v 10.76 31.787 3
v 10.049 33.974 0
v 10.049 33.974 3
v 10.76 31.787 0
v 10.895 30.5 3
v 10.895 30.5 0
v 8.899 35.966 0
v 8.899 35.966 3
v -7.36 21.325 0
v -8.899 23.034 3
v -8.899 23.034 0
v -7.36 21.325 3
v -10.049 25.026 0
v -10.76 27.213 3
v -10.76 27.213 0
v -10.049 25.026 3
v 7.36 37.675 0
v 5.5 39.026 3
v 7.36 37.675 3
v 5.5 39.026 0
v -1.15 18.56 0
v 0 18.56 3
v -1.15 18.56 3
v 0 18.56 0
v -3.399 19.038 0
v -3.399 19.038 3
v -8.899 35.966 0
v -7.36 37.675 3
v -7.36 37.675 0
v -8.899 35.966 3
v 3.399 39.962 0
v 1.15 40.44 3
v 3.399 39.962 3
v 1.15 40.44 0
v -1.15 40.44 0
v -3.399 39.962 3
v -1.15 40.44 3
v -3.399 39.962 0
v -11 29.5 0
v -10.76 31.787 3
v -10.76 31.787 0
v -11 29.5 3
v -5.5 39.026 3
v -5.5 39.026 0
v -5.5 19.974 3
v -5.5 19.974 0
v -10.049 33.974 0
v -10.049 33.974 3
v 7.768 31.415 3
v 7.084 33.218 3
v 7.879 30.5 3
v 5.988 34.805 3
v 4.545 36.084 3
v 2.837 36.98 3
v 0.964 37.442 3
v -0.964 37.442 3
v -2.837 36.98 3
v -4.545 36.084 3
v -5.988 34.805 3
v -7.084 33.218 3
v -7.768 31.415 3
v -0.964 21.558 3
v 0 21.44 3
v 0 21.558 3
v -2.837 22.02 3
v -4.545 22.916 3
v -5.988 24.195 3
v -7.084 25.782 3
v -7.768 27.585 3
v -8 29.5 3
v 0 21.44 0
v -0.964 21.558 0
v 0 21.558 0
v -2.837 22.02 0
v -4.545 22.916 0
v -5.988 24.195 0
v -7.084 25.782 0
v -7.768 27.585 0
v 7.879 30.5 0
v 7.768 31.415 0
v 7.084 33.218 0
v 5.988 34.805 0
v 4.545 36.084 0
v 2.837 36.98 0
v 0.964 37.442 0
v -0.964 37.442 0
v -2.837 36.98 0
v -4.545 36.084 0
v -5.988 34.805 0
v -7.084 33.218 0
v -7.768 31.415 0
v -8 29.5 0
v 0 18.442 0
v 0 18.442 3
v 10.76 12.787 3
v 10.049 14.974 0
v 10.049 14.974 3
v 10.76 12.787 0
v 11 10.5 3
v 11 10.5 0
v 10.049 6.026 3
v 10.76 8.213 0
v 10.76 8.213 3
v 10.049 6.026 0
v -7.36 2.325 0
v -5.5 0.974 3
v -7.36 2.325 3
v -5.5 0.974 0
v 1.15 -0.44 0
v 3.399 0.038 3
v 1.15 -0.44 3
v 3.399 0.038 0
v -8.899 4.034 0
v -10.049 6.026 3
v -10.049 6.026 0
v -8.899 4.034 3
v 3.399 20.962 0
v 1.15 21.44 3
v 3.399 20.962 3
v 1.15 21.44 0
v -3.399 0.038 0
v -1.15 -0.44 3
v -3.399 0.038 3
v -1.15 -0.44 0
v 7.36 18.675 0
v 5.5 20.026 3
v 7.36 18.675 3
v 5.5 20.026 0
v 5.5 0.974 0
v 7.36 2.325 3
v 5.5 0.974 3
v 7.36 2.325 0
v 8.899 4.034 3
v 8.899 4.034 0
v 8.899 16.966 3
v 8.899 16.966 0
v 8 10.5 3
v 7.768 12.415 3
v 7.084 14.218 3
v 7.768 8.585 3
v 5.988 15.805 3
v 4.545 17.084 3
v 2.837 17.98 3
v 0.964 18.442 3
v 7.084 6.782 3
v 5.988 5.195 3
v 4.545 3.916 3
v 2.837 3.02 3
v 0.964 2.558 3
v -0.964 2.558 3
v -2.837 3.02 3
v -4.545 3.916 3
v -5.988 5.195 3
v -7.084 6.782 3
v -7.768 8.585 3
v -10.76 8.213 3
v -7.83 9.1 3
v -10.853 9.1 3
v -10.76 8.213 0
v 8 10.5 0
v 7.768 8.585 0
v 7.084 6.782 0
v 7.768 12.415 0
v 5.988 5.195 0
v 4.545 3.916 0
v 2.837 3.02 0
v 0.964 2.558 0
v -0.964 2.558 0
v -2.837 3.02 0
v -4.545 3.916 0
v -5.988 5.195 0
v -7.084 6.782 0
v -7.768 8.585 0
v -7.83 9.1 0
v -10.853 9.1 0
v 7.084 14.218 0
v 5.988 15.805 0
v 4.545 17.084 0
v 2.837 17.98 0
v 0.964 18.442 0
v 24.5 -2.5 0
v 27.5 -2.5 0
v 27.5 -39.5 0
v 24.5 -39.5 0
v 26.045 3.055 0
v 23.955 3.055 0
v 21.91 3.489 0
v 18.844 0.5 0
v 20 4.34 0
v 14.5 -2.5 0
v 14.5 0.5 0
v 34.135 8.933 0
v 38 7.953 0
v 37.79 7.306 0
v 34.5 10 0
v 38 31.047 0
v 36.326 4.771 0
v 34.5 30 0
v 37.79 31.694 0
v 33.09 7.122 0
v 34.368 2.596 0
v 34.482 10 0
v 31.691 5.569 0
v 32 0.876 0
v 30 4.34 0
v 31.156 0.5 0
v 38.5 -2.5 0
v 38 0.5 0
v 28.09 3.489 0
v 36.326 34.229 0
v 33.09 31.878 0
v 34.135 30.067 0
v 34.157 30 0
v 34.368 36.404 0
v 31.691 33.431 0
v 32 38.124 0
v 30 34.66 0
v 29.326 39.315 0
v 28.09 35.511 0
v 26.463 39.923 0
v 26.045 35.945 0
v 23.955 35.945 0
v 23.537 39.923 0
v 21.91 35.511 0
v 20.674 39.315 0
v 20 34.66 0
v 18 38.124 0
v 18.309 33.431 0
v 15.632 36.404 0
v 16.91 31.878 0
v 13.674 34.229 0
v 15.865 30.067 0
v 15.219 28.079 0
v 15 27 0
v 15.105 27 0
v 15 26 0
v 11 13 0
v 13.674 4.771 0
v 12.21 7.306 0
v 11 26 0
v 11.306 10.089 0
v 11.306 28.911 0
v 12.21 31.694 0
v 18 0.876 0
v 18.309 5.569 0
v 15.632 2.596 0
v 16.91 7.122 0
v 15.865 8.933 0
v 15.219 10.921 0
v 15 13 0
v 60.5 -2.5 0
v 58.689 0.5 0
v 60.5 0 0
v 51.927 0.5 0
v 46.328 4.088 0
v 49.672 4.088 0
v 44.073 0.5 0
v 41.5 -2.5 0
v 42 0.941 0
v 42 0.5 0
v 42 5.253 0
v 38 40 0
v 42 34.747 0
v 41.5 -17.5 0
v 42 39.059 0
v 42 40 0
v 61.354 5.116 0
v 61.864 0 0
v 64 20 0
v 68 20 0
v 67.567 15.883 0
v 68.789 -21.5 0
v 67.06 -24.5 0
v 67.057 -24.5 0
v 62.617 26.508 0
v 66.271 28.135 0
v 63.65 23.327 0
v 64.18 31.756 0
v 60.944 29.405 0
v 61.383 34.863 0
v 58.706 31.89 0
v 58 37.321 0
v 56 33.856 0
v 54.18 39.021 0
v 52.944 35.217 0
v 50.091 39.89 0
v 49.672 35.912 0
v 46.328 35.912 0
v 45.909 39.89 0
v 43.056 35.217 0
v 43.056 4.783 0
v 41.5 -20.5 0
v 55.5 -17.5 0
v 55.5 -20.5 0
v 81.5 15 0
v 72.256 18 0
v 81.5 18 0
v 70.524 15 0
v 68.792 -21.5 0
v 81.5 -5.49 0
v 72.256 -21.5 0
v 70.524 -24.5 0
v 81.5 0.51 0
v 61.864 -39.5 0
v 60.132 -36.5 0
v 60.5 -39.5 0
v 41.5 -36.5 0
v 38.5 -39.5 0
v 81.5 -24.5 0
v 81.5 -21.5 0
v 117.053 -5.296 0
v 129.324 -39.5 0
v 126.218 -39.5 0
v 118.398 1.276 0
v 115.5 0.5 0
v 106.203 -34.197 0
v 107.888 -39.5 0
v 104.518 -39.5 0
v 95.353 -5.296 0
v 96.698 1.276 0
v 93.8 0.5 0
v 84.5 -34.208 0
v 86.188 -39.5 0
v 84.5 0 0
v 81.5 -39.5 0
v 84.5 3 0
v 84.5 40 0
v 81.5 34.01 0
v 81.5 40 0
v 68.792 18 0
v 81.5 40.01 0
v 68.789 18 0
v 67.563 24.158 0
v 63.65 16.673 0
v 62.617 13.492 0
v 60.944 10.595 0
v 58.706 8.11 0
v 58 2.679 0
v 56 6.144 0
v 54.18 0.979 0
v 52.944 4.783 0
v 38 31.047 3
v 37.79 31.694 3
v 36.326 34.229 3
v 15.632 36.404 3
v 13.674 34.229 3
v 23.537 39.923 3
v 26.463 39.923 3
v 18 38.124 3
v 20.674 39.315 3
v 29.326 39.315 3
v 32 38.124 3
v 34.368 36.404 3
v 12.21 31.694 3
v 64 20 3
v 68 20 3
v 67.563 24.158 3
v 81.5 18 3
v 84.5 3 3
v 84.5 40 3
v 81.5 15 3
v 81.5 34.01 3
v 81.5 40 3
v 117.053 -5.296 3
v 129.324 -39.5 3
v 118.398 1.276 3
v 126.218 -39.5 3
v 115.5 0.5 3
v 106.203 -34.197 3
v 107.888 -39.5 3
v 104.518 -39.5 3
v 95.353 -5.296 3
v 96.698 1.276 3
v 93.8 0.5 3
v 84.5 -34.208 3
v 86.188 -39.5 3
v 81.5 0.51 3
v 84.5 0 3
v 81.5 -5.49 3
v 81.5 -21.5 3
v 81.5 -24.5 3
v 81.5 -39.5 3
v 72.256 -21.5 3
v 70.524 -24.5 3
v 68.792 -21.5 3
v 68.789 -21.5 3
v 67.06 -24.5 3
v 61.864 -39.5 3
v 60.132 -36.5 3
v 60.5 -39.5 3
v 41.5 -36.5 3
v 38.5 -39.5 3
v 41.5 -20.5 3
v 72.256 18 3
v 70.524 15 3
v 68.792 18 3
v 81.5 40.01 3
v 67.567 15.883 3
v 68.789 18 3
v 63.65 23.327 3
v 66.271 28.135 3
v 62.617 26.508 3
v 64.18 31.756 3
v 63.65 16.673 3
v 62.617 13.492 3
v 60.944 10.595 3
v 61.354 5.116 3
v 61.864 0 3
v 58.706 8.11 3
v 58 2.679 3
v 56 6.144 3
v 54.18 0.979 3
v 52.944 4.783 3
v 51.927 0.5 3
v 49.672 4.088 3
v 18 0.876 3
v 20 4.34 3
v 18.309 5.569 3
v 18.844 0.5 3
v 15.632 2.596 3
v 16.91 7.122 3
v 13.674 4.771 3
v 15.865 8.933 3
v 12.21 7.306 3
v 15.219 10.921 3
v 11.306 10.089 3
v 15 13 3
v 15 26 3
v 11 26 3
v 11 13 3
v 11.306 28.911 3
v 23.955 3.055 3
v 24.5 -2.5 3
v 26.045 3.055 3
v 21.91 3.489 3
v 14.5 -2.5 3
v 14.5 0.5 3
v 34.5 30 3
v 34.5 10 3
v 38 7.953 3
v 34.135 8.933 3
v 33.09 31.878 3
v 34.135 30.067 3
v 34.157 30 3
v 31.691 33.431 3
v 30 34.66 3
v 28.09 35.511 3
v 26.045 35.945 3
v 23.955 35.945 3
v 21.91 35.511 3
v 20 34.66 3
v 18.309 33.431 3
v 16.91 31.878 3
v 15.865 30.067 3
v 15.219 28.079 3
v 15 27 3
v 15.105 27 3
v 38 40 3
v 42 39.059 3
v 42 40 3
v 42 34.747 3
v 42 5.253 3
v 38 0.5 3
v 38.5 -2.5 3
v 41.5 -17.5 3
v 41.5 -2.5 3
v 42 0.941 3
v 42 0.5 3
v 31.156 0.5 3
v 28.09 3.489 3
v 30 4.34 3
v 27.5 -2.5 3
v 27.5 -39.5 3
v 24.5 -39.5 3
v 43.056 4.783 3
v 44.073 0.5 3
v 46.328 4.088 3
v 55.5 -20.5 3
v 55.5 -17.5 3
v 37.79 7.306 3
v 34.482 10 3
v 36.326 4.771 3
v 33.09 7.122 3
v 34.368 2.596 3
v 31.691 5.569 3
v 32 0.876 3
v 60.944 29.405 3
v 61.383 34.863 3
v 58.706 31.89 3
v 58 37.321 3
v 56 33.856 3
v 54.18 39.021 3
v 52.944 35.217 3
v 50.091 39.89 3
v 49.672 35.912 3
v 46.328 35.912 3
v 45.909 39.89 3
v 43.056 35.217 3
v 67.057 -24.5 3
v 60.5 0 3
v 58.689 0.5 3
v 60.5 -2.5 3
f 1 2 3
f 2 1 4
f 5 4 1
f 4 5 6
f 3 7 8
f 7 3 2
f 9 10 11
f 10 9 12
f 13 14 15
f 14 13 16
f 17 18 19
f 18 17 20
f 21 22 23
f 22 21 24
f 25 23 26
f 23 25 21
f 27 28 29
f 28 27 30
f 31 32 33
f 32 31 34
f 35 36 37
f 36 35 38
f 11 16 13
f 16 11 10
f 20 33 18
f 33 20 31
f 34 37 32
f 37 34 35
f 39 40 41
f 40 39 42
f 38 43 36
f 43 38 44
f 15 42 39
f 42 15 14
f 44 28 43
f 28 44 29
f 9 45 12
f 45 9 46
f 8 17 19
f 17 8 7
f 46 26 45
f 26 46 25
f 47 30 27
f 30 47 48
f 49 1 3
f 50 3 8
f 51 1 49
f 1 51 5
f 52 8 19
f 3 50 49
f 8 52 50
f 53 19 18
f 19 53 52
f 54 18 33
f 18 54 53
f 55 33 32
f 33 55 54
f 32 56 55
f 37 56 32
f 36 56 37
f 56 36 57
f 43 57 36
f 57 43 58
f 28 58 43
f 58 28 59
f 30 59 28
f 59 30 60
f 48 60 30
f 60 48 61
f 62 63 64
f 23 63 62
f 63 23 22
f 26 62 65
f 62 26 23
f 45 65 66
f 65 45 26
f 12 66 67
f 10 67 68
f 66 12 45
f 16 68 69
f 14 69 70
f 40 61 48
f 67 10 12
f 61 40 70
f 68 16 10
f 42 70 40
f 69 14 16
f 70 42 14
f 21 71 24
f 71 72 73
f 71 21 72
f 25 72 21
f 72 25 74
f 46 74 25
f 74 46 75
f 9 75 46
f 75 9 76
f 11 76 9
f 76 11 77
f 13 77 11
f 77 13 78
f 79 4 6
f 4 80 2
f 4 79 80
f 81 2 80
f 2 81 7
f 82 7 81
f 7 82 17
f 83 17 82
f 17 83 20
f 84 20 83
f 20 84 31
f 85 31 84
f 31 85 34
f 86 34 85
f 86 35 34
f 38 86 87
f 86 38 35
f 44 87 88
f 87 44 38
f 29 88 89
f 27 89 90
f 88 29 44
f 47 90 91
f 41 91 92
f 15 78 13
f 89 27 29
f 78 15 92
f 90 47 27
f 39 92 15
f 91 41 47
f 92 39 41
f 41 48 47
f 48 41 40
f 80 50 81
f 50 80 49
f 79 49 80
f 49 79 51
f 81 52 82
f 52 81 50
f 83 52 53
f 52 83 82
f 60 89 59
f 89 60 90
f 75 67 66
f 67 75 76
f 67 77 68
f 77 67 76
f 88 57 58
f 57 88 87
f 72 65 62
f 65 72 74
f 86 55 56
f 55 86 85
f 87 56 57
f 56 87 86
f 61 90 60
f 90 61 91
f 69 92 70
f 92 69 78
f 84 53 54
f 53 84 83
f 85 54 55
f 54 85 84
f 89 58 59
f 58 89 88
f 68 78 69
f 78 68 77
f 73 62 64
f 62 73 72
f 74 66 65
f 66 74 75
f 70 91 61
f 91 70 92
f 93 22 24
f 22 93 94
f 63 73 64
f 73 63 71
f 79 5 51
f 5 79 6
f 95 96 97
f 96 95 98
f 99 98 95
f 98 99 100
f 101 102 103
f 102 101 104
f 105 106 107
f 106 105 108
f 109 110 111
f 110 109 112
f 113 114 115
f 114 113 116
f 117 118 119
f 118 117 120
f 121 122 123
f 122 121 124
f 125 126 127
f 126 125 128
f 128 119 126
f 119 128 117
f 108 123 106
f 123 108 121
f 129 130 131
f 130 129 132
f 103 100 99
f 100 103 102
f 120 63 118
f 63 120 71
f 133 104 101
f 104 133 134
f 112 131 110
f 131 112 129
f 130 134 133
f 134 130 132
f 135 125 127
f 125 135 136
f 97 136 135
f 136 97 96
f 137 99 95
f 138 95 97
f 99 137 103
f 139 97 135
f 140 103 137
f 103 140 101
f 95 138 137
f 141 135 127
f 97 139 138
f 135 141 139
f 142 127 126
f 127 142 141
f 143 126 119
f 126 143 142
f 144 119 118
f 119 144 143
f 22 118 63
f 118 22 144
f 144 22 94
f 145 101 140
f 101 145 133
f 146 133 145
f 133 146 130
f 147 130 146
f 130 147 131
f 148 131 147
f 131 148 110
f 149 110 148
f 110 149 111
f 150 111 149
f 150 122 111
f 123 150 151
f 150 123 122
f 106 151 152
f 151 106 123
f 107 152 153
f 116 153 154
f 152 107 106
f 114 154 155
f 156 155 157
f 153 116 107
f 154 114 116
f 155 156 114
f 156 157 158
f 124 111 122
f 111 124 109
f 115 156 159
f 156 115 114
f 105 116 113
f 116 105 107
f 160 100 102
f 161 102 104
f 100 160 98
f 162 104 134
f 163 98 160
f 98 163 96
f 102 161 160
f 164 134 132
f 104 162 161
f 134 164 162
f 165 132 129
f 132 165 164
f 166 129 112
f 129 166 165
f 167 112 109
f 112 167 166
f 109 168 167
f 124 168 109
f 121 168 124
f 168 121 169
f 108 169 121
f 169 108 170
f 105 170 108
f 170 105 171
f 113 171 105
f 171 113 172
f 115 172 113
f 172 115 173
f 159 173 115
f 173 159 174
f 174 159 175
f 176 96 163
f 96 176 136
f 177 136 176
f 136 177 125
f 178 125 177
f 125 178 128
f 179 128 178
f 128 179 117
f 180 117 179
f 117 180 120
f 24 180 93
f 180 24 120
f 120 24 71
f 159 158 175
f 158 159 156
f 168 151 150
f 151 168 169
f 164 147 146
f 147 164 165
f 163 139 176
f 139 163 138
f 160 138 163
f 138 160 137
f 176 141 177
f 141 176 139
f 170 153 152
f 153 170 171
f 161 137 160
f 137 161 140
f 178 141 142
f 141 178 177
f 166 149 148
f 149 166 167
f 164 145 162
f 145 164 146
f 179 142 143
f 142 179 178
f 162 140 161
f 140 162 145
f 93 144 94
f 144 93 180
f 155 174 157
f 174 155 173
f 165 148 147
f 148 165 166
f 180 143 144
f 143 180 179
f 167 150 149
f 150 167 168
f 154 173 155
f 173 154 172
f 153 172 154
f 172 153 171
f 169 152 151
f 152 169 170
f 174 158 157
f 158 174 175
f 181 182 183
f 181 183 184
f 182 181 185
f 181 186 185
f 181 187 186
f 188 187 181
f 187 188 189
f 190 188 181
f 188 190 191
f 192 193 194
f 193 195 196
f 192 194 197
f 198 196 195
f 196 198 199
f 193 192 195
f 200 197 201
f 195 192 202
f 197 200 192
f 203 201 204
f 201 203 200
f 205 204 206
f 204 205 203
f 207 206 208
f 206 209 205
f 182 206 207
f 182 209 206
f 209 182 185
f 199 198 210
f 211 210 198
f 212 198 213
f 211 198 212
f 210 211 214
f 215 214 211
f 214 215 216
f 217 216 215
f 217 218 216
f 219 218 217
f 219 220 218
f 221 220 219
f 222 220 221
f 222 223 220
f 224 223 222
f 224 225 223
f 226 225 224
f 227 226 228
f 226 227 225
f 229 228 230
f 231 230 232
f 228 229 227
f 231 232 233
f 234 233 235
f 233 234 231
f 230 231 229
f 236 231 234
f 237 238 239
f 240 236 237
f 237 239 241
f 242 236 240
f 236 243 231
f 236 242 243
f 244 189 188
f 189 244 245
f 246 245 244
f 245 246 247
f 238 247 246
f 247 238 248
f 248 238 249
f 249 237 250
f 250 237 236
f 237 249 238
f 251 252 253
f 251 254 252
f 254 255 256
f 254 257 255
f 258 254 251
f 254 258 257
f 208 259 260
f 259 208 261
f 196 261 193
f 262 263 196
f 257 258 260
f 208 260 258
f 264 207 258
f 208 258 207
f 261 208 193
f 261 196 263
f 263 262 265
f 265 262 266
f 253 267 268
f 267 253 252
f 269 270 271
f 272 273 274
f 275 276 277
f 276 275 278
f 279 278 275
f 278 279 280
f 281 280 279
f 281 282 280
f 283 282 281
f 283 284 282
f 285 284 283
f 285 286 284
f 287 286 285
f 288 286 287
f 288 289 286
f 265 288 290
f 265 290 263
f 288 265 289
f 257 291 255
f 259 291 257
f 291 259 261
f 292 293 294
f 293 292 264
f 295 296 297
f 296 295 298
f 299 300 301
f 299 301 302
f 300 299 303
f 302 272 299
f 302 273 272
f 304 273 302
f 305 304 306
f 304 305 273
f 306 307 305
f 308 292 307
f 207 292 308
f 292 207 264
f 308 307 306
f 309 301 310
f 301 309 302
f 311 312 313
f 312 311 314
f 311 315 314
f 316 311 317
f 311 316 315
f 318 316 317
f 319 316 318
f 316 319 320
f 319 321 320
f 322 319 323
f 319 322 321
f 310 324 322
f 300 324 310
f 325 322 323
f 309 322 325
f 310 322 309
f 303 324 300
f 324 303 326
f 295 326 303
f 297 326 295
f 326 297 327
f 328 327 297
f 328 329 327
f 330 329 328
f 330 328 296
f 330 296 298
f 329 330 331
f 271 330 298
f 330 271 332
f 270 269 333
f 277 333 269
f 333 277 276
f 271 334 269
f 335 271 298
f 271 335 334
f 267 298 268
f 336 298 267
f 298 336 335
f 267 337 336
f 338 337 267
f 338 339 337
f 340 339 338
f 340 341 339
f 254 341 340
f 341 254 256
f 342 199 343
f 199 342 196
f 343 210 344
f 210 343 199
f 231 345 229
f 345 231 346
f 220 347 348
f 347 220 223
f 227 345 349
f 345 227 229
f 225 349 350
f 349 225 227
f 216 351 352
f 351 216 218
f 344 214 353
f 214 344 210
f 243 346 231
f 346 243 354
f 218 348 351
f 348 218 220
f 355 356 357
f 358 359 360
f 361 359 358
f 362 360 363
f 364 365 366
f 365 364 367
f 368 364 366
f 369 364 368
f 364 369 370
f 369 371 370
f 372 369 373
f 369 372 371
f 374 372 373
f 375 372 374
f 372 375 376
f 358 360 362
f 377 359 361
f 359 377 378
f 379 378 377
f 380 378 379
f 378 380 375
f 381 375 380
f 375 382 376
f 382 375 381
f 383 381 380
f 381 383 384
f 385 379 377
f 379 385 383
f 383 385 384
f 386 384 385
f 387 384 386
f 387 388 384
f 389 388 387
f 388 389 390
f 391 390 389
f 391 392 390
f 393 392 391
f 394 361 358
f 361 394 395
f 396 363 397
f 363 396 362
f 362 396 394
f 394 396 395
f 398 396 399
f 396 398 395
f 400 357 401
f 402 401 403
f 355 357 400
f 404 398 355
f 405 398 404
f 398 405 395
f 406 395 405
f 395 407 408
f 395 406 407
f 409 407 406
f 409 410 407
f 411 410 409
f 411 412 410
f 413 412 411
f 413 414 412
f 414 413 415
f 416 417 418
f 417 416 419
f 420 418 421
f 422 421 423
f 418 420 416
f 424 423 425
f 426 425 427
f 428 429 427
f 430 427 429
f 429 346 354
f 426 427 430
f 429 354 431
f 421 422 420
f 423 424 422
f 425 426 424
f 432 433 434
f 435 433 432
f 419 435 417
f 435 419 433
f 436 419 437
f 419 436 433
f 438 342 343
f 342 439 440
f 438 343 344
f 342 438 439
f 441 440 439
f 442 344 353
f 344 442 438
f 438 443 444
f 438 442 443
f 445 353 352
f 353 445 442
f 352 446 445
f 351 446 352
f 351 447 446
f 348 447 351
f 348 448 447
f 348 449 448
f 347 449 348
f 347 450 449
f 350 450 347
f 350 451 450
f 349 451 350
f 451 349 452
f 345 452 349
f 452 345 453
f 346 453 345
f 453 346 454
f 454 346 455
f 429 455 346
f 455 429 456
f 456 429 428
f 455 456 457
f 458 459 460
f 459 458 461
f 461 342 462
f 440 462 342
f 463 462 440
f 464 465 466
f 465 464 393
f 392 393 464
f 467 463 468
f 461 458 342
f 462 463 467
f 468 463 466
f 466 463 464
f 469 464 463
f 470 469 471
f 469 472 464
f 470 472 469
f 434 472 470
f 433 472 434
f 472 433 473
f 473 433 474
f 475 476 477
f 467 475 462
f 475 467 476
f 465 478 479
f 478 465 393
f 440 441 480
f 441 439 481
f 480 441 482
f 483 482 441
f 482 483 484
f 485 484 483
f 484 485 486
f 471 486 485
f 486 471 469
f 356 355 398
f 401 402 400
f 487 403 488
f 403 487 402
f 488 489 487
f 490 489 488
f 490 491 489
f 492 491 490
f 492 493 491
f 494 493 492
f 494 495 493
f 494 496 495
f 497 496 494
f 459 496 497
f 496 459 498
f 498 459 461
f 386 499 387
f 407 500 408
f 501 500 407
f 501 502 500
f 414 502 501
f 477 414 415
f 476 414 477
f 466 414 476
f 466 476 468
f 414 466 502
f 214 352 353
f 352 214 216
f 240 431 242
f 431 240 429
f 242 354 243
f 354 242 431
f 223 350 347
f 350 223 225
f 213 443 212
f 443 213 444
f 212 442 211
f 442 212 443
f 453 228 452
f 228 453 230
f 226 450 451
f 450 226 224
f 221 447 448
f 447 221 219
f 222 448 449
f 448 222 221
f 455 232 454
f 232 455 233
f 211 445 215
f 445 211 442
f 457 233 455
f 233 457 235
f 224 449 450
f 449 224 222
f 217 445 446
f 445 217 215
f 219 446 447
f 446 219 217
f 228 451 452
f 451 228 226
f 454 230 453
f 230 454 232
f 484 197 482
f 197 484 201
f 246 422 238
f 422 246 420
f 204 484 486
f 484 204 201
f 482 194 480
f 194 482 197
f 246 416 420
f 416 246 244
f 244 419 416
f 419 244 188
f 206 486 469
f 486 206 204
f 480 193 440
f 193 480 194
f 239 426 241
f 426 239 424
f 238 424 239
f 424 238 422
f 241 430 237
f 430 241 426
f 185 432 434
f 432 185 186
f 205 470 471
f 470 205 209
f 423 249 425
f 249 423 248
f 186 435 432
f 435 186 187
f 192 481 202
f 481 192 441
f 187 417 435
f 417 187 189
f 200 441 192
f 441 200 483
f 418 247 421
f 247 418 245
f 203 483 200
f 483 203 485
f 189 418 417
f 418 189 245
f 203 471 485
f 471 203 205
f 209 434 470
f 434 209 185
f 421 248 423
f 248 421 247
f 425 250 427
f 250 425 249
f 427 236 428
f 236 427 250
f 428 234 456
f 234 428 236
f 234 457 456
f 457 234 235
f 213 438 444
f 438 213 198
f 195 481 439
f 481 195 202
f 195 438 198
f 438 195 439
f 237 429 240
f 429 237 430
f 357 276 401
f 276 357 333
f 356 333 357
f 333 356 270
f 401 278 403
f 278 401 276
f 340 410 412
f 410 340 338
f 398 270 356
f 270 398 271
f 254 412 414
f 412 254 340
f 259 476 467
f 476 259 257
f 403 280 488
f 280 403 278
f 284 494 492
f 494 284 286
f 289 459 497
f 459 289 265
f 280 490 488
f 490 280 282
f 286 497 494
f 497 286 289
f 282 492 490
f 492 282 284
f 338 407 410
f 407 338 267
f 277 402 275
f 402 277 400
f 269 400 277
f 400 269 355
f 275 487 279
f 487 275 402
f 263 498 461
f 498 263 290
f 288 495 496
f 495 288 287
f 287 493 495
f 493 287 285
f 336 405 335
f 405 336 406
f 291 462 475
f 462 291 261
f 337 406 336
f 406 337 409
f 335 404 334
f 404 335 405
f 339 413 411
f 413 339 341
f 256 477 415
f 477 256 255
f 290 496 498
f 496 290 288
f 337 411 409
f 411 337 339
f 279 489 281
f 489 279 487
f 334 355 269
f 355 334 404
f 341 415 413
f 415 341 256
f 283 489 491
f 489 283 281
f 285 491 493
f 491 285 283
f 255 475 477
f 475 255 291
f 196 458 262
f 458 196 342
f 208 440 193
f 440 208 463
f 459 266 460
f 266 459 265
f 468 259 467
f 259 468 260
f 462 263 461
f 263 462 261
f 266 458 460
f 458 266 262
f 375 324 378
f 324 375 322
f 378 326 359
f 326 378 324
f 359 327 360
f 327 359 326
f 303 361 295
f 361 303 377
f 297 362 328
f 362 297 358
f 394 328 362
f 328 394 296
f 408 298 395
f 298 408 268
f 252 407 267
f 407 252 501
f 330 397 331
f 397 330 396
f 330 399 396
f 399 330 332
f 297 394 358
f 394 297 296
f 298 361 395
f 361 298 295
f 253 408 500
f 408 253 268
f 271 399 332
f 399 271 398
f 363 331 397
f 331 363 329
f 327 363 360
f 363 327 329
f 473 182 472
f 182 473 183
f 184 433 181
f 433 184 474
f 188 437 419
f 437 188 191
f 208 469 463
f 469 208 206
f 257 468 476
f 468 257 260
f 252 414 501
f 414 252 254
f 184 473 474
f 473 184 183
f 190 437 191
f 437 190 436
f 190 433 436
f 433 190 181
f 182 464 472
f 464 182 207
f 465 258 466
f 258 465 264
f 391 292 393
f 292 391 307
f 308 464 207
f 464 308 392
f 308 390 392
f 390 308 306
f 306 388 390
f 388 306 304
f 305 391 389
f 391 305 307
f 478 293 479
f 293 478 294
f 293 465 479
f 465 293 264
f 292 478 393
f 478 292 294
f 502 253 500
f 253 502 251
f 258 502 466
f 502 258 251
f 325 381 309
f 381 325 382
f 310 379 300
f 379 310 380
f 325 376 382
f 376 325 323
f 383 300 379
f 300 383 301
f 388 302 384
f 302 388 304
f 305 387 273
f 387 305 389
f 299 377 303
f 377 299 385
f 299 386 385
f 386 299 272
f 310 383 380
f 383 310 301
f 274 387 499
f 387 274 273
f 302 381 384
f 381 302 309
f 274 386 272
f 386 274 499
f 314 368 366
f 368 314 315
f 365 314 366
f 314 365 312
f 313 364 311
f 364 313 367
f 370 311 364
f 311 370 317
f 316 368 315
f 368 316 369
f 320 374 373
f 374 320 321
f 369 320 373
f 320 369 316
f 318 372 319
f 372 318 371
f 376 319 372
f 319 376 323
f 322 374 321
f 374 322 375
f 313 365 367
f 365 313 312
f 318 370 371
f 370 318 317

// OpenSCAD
// S

translate([0,20,0])
union(){
translate([0,0.5,0]){
difference(){
  translate([0,9,0]) cylinder(3,11,11);
  translate([0,9,-1]) cylinder(5,8,8);
  translate([0,-3,-1]) cube([15,13,5]);
}

} 
translate([0,-0.5,0]){
difference(){
  translate([0,-9,0]) cylinder(3,11,11);
  translate([0,-9,-1]) cylinder(5,8,8);
 translate([-15,-10.4,-1]) cube([15,13,5]);
}
}
}




// буква О
translate([-15,0,0])
union(){
  translate([49.5,10,0]) cube([4,20,3]);
  translate([26,13,0]) cube([4,13,3]);
difference(){
union(){
	
  difference(){
  translate([40,26,0]) cylinder(3,14,14);
  translate([40,26,-1]) cylinder(5,10,10);
  translate([33,10,-1]) cube([20,10,5]);

}

difference(){
  translate([40,13,0]) cylinder(3,14,14);
  translate([40,13,-1]) cylinder(5,10,10);
  translate([32,17,-1]) cube([19,10,5]);
  translate([40,17,-1]) cube(20);
}
}
  translate([30,13,-1]) cube([5,14,5]);
  translate([42,10,-1]) cube(20);
}
}

//D
translate([43,0,0]) 
union(){
   translate([-5,0,0]) cube([4,40,3]);
 difference(){
    translate([5,20,0]) cylinder(3,20,20);
     translate([5,20,-1]) cylinder(6,16,16);
      translate([-15,0,-1]) cube([10,40,6]);
}
}
 
//A
translate([81.5,0,0])
 union(){
    difference(){
   union(){
    cube([3,40,3]);
   translate([-23.1,0,0]) rotate([0,0,-30])  cube([3,50,3]);
   translate([-15,15,0]) cube([20,3,3]);
}
   translate([-40,-8,-1]) cube([30,8,5]);
   translate([3,3,-1]) cube([10,40,5]);
  translate([-34.65,0,-1]) rotate([0,0,-30]) cube([10,40,5]);
  translate([0,40,-1]) cube(10);
}
}  


//TEAM
 
  translate([2.5,-39.5,0]){
   translate([22,0,0])

//T 
  union(){
  union(){ 
  cube([3,40,3]);
   translate([-10,37,0]) cube([25,3,3]);
}
}

//E
  translate([36,0,0])
   union(){ 
    cube([3,40,3]);
    cube([22,3,3]);
     translate([0,19,0]) cube([17,3,3]);
     translate([0,37,0]) cube([22,3,3]);
}

//A
   translate([79,0,0])
  union(){
    difference(){
  union(){
   cube([3,40,3]);
   translate([-23.1,0,0]) rotate([0,0,-30])  cube([3,50,3]);
   translate([-15,15,0]) cube([20,3,3]);
}
  translate([-40,-8,-1]) cube([60,8,5]);
  translate([3,3,-1]) cube([10,40,5]);
  translate([-34.65,0,-1]) rotate([0,0,-30]) cube([10,40,5]);
  translate([0,42,-1]) cube(10);
}
}  


//M
translate([129,40,0])
  rotate([0,0,-90])
difference(){
union(){
  translate([0,-16,0]) rotate([0,0,15]) cube([43,3,3]);
  translate([0,-16,0]) rotate([0,0,-15]) cube([43,3,3]);

 translate([0,-37.7,0]) rotate([0,0,15]) cube([43,3,3]);

 translate([0,-37.7,0])
  rotate([0,0,-15]) cube([43,3,3]);
}
 translate([40,-60,0]) cube([5,60,6]);
}
}
